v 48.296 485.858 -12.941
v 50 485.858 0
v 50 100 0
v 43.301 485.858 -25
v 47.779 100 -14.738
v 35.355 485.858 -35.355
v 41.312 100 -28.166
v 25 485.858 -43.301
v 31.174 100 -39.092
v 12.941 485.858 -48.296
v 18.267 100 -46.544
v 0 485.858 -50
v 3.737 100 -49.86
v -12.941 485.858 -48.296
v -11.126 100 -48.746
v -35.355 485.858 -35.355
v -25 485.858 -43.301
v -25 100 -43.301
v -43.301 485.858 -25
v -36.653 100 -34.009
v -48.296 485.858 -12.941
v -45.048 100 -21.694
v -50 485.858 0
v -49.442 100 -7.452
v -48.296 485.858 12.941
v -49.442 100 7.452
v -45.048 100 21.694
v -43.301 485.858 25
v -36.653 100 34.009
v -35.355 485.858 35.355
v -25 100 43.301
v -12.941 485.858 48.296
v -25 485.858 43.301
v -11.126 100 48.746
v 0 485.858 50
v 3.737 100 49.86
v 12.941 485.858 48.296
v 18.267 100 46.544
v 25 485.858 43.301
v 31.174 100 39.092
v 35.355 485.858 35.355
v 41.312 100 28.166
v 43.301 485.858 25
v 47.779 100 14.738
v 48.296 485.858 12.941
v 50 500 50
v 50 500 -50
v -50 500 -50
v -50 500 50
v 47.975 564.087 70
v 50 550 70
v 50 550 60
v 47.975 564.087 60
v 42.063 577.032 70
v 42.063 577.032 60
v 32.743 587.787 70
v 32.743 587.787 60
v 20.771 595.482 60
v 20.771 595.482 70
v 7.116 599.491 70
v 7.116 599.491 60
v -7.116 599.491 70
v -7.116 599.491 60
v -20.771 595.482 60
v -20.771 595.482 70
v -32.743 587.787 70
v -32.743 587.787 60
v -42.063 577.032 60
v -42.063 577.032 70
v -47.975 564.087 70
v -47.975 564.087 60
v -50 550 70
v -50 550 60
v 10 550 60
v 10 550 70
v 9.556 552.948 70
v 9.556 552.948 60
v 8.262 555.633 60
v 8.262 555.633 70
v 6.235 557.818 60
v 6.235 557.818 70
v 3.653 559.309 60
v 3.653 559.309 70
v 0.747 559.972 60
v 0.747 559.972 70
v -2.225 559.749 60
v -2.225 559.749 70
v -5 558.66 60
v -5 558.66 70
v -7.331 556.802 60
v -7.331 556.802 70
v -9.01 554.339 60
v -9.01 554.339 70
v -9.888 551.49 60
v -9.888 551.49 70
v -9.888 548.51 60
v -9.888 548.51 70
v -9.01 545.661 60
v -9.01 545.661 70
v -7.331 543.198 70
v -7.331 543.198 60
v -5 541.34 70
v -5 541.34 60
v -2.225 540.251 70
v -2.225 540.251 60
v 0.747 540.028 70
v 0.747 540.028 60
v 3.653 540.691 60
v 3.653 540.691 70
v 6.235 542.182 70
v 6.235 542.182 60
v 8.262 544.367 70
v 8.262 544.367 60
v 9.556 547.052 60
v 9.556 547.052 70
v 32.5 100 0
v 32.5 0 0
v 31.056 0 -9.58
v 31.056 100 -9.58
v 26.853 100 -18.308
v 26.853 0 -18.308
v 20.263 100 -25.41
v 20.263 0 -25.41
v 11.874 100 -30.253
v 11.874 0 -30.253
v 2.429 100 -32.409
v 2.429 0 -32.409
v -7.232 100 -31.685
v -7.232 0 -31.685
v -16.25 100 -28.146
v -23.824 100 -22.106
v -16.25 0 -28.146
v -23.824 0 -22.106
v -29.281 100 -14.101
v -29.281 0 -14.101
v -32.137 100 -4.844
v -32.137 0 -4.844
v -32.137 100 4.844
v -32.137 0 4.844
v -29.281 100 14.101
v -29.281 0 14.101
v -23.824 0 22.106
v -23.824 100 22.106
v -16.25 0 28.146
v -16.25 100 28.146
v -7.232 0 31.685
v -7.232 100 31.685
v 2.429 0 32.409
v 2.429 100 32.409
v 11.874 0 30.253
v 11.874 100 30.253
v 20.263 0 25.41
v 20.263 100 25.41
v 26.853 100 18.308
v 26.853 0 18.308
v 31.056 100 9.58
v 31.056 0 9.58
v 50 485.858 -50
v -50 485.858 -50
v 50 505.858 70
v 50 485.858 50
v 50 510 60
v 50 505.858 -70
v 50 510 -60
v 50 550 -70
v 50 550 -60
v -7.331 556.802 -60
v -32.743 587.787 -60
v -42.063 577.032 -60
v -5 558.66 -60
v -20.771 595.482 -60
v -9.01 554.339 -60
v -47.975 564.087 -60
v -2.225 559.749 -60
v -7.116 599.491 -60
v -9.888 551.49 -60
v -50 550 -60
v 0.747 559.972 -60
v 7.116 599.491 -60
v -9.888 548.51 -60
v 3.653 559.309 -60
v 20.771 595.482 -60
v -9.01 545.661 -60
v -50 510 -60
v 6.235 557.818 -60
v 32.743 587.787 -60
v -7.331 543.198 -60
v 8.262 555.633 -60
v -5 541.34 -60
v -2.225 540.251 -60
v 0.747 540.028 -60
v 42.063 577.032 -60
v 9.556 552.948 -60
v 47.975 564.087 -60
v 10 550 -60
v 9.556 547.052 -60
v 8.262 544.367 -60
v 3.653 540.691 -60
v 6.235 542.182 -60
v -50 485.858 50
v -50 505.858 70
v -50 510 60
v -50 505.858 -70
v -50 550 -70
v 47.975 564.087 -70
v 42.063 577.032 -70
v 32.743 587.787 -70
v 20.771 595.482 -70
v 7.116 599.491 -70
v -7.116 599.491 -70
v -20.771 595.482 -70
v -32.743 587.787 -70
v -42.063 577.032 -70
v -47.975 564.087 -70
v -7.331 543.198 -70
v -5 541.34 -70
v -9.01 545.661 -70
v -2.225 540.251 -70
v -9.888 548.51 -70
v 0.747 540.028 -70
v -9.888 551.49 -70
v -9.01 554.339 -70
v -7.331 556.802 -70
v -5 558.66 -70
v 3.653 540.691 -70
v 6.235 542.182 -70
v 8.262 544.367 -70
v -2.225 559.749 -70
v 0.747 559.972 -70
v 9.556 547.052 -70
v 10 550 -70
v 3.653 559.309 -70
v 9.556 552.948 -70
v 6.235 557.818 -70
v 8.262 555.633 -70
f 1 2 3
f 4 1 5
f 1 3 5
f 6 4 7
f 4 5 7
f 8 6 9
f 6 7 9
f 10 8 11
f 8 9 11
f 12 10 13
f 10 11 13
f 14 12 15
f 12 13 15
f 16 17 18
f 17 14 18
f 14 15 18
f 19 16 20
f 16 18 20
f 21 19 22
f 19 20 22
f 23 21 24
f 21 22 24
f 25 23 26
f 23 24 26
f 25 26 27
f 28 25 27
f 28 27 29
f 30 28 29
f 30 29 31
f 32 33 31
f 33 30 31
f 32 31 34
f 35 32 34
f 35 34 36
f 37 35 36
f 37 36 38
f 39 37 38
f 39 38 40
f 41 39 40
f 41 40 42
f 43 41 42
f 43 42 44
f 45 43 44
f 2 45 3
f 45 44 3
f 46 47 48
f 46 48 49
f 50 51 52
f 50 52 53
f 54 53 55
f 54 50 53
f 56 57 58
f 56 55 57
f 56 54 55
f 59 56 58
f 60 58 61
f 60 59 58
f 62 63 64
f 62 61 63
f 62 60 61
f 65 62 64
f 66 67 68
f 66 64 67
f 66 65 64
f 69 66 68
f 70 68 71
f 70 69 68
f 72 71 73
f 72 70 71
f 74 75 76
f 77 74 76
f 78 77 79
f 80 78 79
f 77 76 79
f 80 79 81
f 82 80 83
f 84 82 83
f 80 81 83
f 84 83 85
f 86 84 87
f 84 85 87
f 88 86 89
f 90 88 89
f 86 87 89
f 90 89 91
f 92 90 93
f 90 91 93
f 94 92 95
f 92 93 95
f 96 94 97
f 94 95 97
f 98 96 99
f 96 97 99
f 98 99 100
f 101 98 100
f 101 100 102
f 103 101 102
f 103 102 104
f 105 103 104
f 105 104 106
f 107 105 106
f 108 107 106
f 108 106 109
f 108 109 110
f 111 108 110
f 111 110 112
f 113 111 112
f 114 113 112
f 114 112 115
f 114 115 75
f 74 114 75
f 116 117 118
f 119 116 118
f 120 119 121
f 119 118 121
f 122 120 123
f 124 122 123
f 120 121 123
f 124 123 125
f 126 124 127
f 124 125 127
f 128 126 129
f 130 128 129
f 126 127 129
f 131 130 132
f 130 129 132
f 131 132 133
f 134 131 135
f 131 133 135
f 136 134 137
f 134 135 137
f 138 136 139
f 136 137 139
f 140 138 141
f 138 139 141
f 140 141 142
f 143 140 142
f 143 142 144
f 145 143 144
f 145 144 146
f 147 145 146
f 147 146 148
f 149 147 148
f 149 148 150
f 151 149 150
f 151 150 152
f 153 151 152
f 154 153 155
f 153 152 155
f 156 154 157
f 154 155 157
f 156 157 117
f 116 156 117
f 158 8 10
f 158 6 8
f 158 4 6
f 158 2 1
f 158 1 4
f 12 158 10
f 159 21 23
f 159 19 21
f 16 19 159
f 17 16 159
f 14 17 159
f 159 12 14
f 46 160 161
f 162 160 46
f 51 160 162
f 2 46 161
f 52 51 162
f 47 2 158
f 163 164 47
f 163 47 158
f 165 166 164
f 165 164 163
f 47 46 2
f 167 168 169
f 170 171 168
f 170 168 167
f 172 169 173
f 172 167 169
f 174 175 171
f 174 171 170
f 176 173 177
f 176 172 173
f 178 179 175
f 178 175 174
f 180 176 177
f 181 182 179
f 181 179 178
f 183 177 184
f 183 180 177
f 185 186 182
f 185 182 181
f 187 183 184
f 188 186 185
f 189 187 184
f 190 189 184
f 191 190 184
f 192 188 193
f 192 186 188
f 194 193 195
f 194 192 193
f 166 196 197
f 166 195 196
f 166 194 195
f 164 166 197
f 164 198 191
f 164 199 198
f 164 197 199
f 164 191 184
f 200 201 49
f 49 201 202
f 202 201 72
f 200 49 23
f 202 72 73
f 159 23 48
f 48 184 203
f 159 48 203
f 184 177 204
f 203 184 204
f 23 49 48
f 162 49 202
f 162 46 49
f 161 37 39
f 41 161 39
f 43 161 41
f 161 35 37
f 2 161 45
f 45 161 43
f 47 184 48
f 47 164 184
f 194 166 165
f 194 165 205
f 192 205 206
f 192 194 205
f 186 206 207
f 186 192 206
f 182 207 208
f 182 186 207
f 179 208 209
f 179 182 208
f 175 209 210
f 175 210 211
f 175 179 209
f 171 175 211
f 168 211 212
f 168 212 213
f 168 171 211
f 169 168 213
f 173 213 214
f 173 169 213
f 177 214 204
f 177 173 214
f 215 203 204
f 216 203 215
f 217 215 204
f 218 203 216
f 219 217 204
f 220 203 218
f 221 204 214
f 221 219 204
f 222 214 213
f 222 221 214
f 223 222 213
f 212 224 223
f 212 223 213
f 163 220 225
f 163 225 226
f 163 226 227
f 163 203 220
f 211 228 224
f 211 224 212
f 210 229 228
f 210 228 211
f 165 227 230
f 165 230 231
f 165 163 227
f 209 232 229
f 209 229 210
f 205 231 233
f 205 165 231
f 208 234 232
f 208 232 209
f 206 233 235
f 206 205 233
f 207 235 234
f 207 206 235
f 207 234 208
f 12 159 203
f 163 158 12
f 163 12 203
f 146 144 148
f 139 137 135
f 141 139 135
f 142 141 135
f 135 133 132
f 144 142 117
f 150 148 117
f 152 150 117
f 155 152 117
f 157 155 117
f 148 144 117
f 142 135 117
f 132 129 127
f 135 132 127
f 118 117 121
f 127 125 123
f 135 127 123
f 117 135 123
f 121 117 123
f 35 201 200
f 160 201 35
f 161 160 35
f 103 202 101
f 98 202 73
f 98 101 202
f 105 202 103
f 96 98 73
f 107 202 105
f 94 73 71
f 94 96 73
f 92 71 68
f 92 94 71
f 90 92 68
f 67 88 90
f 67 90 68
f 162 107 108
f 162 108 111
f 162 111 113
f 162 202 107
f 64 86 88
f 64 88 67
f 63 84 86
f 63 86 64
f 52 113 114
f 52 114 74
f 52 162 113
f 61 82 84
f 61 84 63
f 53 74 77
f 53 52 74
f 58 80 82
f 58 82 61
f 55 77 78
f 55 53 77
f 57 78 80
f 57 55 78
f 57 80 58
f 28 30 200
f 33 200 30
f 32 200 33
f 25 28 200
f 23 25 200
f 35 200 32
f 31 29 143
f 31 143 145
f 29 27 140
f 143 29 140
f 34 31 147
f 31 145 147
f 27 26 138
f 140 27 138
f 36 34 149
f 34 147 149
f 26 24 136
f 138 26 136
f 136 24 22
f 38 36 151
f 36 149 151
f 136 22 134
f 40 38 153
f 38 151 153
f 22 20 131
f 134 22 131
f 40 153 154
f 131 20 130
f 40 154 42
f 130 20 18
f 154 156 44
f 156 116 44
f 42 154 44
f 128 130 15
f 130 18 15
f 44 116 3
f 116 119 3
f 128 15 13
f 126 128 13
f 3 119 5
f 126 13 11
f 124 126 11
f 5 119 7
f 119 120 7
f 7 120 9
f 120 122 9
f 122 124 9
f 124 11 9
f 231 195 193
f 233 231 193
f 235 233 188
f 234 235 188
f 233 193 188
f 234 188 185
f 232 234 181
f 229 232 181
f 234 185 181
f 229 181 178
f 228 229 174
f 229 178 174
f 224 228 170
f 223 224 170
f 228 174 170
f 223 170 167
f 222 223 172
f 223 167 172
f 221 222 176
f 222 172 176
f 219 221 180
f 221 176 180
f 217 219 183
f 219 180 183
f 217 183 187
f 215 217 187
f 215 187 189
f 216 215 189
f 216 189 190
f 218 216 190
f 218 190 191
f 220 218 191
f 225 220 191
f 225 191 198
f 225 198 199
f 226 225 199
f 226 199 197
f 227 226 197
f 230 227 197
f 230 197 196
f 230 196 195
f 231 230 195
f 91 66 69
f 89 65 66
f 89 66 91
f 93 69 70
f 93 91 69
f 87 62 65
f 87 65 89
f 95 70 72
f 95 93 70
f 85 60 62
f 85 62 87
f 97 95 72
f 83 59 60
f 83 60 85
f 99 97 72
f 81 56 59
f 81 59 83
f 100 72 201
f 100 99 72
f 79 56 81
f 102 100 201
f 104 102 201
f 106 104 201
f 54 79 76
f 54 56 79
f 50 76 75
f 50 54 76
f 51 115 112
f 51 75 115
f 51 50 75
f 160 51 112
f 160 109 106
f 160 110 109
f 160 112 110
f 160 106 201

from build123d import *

# Parameters (mm, degrees)
SKETCH1_R               = 32.5
BOSS_EXTRUDE1_DEPTH     = 100
SKETCH2_R               = 50
BOSS_EXTRUDE2_DEPTH     = 400
BOSS_EXTRUDE3_DEPTH     = 50
SKETCH7_R               = 10
CUT_EXTRUDE2_DEPTH      = 1
CUT_EXTRUDE2_DEPTH_BACK = 141


with BuildPart() as part:
    # Sketch1 → Boss-Extrude1 (new body)
    with BuildSketch(Plane(origin=(0, 0, 0), x_dir=(1, 0, 0), z_dir=(0, 1, 0))):
        Circle(SKETCH1_R)
    extrude(amount=BOSS_EXTRUDE1_DEPTH)

    # Sketch2 → Boss-Extrude2 (add)
    with BuildSketch(Plane(origin=(0, 100, 0), x_dir=(1, 0, 0), z_dir=(0, 1, 0))):
        Circle(SKETCH2_R)
    extrude(amount=BOSS_EXTRUDE2_DEPTH)

    # Sketch6 → Boss-Extrude3 (add, symmetric)
    with BuildSketch(Plane(origin=(0, 0, 0), x_dir=(0, 0, -1), z_dir=(1, 0, 0))):
        Polygon((-50, 500), (-60, 510), (-60, 600), (-70, 600), (-70, 505.857864376), (-50, 485.857864376), (50, 485.857864376), (70, 505.857864376), (70, 600), (60, 600), (60, 510), (50, 500), align=None)
    extrude(amount=BOSS_EXTRUDE3_DEPTH, both=True)

    # Sketch7 → Cut-Extrude2 (cut, two sides)
    with BuildSketch(Plane.XY.offset(70)) as cut_extrude2_sk:
        with Locations((0, 550)):
            Circle(SKETCH7_R)
        with BuildLine():
            Line((-50, 550), (-50, 605))
            Line((-50, 605), (50, 605))
            Line((50, 605), (50, 550))
            ThreePointArc((50, 550), (0, 600), (-50, 550))
        make_face()
    extrude(amount=CUT_EXTRUDE2_DEPTH, mode=Mode.SUBTRACT)
    extrude(cut_extrude2_sk.sketch, amount=-CUT_EXTRUDE2_DEPTH_BACK, mode=Mode.SUBTRACT)


solid = part.part
